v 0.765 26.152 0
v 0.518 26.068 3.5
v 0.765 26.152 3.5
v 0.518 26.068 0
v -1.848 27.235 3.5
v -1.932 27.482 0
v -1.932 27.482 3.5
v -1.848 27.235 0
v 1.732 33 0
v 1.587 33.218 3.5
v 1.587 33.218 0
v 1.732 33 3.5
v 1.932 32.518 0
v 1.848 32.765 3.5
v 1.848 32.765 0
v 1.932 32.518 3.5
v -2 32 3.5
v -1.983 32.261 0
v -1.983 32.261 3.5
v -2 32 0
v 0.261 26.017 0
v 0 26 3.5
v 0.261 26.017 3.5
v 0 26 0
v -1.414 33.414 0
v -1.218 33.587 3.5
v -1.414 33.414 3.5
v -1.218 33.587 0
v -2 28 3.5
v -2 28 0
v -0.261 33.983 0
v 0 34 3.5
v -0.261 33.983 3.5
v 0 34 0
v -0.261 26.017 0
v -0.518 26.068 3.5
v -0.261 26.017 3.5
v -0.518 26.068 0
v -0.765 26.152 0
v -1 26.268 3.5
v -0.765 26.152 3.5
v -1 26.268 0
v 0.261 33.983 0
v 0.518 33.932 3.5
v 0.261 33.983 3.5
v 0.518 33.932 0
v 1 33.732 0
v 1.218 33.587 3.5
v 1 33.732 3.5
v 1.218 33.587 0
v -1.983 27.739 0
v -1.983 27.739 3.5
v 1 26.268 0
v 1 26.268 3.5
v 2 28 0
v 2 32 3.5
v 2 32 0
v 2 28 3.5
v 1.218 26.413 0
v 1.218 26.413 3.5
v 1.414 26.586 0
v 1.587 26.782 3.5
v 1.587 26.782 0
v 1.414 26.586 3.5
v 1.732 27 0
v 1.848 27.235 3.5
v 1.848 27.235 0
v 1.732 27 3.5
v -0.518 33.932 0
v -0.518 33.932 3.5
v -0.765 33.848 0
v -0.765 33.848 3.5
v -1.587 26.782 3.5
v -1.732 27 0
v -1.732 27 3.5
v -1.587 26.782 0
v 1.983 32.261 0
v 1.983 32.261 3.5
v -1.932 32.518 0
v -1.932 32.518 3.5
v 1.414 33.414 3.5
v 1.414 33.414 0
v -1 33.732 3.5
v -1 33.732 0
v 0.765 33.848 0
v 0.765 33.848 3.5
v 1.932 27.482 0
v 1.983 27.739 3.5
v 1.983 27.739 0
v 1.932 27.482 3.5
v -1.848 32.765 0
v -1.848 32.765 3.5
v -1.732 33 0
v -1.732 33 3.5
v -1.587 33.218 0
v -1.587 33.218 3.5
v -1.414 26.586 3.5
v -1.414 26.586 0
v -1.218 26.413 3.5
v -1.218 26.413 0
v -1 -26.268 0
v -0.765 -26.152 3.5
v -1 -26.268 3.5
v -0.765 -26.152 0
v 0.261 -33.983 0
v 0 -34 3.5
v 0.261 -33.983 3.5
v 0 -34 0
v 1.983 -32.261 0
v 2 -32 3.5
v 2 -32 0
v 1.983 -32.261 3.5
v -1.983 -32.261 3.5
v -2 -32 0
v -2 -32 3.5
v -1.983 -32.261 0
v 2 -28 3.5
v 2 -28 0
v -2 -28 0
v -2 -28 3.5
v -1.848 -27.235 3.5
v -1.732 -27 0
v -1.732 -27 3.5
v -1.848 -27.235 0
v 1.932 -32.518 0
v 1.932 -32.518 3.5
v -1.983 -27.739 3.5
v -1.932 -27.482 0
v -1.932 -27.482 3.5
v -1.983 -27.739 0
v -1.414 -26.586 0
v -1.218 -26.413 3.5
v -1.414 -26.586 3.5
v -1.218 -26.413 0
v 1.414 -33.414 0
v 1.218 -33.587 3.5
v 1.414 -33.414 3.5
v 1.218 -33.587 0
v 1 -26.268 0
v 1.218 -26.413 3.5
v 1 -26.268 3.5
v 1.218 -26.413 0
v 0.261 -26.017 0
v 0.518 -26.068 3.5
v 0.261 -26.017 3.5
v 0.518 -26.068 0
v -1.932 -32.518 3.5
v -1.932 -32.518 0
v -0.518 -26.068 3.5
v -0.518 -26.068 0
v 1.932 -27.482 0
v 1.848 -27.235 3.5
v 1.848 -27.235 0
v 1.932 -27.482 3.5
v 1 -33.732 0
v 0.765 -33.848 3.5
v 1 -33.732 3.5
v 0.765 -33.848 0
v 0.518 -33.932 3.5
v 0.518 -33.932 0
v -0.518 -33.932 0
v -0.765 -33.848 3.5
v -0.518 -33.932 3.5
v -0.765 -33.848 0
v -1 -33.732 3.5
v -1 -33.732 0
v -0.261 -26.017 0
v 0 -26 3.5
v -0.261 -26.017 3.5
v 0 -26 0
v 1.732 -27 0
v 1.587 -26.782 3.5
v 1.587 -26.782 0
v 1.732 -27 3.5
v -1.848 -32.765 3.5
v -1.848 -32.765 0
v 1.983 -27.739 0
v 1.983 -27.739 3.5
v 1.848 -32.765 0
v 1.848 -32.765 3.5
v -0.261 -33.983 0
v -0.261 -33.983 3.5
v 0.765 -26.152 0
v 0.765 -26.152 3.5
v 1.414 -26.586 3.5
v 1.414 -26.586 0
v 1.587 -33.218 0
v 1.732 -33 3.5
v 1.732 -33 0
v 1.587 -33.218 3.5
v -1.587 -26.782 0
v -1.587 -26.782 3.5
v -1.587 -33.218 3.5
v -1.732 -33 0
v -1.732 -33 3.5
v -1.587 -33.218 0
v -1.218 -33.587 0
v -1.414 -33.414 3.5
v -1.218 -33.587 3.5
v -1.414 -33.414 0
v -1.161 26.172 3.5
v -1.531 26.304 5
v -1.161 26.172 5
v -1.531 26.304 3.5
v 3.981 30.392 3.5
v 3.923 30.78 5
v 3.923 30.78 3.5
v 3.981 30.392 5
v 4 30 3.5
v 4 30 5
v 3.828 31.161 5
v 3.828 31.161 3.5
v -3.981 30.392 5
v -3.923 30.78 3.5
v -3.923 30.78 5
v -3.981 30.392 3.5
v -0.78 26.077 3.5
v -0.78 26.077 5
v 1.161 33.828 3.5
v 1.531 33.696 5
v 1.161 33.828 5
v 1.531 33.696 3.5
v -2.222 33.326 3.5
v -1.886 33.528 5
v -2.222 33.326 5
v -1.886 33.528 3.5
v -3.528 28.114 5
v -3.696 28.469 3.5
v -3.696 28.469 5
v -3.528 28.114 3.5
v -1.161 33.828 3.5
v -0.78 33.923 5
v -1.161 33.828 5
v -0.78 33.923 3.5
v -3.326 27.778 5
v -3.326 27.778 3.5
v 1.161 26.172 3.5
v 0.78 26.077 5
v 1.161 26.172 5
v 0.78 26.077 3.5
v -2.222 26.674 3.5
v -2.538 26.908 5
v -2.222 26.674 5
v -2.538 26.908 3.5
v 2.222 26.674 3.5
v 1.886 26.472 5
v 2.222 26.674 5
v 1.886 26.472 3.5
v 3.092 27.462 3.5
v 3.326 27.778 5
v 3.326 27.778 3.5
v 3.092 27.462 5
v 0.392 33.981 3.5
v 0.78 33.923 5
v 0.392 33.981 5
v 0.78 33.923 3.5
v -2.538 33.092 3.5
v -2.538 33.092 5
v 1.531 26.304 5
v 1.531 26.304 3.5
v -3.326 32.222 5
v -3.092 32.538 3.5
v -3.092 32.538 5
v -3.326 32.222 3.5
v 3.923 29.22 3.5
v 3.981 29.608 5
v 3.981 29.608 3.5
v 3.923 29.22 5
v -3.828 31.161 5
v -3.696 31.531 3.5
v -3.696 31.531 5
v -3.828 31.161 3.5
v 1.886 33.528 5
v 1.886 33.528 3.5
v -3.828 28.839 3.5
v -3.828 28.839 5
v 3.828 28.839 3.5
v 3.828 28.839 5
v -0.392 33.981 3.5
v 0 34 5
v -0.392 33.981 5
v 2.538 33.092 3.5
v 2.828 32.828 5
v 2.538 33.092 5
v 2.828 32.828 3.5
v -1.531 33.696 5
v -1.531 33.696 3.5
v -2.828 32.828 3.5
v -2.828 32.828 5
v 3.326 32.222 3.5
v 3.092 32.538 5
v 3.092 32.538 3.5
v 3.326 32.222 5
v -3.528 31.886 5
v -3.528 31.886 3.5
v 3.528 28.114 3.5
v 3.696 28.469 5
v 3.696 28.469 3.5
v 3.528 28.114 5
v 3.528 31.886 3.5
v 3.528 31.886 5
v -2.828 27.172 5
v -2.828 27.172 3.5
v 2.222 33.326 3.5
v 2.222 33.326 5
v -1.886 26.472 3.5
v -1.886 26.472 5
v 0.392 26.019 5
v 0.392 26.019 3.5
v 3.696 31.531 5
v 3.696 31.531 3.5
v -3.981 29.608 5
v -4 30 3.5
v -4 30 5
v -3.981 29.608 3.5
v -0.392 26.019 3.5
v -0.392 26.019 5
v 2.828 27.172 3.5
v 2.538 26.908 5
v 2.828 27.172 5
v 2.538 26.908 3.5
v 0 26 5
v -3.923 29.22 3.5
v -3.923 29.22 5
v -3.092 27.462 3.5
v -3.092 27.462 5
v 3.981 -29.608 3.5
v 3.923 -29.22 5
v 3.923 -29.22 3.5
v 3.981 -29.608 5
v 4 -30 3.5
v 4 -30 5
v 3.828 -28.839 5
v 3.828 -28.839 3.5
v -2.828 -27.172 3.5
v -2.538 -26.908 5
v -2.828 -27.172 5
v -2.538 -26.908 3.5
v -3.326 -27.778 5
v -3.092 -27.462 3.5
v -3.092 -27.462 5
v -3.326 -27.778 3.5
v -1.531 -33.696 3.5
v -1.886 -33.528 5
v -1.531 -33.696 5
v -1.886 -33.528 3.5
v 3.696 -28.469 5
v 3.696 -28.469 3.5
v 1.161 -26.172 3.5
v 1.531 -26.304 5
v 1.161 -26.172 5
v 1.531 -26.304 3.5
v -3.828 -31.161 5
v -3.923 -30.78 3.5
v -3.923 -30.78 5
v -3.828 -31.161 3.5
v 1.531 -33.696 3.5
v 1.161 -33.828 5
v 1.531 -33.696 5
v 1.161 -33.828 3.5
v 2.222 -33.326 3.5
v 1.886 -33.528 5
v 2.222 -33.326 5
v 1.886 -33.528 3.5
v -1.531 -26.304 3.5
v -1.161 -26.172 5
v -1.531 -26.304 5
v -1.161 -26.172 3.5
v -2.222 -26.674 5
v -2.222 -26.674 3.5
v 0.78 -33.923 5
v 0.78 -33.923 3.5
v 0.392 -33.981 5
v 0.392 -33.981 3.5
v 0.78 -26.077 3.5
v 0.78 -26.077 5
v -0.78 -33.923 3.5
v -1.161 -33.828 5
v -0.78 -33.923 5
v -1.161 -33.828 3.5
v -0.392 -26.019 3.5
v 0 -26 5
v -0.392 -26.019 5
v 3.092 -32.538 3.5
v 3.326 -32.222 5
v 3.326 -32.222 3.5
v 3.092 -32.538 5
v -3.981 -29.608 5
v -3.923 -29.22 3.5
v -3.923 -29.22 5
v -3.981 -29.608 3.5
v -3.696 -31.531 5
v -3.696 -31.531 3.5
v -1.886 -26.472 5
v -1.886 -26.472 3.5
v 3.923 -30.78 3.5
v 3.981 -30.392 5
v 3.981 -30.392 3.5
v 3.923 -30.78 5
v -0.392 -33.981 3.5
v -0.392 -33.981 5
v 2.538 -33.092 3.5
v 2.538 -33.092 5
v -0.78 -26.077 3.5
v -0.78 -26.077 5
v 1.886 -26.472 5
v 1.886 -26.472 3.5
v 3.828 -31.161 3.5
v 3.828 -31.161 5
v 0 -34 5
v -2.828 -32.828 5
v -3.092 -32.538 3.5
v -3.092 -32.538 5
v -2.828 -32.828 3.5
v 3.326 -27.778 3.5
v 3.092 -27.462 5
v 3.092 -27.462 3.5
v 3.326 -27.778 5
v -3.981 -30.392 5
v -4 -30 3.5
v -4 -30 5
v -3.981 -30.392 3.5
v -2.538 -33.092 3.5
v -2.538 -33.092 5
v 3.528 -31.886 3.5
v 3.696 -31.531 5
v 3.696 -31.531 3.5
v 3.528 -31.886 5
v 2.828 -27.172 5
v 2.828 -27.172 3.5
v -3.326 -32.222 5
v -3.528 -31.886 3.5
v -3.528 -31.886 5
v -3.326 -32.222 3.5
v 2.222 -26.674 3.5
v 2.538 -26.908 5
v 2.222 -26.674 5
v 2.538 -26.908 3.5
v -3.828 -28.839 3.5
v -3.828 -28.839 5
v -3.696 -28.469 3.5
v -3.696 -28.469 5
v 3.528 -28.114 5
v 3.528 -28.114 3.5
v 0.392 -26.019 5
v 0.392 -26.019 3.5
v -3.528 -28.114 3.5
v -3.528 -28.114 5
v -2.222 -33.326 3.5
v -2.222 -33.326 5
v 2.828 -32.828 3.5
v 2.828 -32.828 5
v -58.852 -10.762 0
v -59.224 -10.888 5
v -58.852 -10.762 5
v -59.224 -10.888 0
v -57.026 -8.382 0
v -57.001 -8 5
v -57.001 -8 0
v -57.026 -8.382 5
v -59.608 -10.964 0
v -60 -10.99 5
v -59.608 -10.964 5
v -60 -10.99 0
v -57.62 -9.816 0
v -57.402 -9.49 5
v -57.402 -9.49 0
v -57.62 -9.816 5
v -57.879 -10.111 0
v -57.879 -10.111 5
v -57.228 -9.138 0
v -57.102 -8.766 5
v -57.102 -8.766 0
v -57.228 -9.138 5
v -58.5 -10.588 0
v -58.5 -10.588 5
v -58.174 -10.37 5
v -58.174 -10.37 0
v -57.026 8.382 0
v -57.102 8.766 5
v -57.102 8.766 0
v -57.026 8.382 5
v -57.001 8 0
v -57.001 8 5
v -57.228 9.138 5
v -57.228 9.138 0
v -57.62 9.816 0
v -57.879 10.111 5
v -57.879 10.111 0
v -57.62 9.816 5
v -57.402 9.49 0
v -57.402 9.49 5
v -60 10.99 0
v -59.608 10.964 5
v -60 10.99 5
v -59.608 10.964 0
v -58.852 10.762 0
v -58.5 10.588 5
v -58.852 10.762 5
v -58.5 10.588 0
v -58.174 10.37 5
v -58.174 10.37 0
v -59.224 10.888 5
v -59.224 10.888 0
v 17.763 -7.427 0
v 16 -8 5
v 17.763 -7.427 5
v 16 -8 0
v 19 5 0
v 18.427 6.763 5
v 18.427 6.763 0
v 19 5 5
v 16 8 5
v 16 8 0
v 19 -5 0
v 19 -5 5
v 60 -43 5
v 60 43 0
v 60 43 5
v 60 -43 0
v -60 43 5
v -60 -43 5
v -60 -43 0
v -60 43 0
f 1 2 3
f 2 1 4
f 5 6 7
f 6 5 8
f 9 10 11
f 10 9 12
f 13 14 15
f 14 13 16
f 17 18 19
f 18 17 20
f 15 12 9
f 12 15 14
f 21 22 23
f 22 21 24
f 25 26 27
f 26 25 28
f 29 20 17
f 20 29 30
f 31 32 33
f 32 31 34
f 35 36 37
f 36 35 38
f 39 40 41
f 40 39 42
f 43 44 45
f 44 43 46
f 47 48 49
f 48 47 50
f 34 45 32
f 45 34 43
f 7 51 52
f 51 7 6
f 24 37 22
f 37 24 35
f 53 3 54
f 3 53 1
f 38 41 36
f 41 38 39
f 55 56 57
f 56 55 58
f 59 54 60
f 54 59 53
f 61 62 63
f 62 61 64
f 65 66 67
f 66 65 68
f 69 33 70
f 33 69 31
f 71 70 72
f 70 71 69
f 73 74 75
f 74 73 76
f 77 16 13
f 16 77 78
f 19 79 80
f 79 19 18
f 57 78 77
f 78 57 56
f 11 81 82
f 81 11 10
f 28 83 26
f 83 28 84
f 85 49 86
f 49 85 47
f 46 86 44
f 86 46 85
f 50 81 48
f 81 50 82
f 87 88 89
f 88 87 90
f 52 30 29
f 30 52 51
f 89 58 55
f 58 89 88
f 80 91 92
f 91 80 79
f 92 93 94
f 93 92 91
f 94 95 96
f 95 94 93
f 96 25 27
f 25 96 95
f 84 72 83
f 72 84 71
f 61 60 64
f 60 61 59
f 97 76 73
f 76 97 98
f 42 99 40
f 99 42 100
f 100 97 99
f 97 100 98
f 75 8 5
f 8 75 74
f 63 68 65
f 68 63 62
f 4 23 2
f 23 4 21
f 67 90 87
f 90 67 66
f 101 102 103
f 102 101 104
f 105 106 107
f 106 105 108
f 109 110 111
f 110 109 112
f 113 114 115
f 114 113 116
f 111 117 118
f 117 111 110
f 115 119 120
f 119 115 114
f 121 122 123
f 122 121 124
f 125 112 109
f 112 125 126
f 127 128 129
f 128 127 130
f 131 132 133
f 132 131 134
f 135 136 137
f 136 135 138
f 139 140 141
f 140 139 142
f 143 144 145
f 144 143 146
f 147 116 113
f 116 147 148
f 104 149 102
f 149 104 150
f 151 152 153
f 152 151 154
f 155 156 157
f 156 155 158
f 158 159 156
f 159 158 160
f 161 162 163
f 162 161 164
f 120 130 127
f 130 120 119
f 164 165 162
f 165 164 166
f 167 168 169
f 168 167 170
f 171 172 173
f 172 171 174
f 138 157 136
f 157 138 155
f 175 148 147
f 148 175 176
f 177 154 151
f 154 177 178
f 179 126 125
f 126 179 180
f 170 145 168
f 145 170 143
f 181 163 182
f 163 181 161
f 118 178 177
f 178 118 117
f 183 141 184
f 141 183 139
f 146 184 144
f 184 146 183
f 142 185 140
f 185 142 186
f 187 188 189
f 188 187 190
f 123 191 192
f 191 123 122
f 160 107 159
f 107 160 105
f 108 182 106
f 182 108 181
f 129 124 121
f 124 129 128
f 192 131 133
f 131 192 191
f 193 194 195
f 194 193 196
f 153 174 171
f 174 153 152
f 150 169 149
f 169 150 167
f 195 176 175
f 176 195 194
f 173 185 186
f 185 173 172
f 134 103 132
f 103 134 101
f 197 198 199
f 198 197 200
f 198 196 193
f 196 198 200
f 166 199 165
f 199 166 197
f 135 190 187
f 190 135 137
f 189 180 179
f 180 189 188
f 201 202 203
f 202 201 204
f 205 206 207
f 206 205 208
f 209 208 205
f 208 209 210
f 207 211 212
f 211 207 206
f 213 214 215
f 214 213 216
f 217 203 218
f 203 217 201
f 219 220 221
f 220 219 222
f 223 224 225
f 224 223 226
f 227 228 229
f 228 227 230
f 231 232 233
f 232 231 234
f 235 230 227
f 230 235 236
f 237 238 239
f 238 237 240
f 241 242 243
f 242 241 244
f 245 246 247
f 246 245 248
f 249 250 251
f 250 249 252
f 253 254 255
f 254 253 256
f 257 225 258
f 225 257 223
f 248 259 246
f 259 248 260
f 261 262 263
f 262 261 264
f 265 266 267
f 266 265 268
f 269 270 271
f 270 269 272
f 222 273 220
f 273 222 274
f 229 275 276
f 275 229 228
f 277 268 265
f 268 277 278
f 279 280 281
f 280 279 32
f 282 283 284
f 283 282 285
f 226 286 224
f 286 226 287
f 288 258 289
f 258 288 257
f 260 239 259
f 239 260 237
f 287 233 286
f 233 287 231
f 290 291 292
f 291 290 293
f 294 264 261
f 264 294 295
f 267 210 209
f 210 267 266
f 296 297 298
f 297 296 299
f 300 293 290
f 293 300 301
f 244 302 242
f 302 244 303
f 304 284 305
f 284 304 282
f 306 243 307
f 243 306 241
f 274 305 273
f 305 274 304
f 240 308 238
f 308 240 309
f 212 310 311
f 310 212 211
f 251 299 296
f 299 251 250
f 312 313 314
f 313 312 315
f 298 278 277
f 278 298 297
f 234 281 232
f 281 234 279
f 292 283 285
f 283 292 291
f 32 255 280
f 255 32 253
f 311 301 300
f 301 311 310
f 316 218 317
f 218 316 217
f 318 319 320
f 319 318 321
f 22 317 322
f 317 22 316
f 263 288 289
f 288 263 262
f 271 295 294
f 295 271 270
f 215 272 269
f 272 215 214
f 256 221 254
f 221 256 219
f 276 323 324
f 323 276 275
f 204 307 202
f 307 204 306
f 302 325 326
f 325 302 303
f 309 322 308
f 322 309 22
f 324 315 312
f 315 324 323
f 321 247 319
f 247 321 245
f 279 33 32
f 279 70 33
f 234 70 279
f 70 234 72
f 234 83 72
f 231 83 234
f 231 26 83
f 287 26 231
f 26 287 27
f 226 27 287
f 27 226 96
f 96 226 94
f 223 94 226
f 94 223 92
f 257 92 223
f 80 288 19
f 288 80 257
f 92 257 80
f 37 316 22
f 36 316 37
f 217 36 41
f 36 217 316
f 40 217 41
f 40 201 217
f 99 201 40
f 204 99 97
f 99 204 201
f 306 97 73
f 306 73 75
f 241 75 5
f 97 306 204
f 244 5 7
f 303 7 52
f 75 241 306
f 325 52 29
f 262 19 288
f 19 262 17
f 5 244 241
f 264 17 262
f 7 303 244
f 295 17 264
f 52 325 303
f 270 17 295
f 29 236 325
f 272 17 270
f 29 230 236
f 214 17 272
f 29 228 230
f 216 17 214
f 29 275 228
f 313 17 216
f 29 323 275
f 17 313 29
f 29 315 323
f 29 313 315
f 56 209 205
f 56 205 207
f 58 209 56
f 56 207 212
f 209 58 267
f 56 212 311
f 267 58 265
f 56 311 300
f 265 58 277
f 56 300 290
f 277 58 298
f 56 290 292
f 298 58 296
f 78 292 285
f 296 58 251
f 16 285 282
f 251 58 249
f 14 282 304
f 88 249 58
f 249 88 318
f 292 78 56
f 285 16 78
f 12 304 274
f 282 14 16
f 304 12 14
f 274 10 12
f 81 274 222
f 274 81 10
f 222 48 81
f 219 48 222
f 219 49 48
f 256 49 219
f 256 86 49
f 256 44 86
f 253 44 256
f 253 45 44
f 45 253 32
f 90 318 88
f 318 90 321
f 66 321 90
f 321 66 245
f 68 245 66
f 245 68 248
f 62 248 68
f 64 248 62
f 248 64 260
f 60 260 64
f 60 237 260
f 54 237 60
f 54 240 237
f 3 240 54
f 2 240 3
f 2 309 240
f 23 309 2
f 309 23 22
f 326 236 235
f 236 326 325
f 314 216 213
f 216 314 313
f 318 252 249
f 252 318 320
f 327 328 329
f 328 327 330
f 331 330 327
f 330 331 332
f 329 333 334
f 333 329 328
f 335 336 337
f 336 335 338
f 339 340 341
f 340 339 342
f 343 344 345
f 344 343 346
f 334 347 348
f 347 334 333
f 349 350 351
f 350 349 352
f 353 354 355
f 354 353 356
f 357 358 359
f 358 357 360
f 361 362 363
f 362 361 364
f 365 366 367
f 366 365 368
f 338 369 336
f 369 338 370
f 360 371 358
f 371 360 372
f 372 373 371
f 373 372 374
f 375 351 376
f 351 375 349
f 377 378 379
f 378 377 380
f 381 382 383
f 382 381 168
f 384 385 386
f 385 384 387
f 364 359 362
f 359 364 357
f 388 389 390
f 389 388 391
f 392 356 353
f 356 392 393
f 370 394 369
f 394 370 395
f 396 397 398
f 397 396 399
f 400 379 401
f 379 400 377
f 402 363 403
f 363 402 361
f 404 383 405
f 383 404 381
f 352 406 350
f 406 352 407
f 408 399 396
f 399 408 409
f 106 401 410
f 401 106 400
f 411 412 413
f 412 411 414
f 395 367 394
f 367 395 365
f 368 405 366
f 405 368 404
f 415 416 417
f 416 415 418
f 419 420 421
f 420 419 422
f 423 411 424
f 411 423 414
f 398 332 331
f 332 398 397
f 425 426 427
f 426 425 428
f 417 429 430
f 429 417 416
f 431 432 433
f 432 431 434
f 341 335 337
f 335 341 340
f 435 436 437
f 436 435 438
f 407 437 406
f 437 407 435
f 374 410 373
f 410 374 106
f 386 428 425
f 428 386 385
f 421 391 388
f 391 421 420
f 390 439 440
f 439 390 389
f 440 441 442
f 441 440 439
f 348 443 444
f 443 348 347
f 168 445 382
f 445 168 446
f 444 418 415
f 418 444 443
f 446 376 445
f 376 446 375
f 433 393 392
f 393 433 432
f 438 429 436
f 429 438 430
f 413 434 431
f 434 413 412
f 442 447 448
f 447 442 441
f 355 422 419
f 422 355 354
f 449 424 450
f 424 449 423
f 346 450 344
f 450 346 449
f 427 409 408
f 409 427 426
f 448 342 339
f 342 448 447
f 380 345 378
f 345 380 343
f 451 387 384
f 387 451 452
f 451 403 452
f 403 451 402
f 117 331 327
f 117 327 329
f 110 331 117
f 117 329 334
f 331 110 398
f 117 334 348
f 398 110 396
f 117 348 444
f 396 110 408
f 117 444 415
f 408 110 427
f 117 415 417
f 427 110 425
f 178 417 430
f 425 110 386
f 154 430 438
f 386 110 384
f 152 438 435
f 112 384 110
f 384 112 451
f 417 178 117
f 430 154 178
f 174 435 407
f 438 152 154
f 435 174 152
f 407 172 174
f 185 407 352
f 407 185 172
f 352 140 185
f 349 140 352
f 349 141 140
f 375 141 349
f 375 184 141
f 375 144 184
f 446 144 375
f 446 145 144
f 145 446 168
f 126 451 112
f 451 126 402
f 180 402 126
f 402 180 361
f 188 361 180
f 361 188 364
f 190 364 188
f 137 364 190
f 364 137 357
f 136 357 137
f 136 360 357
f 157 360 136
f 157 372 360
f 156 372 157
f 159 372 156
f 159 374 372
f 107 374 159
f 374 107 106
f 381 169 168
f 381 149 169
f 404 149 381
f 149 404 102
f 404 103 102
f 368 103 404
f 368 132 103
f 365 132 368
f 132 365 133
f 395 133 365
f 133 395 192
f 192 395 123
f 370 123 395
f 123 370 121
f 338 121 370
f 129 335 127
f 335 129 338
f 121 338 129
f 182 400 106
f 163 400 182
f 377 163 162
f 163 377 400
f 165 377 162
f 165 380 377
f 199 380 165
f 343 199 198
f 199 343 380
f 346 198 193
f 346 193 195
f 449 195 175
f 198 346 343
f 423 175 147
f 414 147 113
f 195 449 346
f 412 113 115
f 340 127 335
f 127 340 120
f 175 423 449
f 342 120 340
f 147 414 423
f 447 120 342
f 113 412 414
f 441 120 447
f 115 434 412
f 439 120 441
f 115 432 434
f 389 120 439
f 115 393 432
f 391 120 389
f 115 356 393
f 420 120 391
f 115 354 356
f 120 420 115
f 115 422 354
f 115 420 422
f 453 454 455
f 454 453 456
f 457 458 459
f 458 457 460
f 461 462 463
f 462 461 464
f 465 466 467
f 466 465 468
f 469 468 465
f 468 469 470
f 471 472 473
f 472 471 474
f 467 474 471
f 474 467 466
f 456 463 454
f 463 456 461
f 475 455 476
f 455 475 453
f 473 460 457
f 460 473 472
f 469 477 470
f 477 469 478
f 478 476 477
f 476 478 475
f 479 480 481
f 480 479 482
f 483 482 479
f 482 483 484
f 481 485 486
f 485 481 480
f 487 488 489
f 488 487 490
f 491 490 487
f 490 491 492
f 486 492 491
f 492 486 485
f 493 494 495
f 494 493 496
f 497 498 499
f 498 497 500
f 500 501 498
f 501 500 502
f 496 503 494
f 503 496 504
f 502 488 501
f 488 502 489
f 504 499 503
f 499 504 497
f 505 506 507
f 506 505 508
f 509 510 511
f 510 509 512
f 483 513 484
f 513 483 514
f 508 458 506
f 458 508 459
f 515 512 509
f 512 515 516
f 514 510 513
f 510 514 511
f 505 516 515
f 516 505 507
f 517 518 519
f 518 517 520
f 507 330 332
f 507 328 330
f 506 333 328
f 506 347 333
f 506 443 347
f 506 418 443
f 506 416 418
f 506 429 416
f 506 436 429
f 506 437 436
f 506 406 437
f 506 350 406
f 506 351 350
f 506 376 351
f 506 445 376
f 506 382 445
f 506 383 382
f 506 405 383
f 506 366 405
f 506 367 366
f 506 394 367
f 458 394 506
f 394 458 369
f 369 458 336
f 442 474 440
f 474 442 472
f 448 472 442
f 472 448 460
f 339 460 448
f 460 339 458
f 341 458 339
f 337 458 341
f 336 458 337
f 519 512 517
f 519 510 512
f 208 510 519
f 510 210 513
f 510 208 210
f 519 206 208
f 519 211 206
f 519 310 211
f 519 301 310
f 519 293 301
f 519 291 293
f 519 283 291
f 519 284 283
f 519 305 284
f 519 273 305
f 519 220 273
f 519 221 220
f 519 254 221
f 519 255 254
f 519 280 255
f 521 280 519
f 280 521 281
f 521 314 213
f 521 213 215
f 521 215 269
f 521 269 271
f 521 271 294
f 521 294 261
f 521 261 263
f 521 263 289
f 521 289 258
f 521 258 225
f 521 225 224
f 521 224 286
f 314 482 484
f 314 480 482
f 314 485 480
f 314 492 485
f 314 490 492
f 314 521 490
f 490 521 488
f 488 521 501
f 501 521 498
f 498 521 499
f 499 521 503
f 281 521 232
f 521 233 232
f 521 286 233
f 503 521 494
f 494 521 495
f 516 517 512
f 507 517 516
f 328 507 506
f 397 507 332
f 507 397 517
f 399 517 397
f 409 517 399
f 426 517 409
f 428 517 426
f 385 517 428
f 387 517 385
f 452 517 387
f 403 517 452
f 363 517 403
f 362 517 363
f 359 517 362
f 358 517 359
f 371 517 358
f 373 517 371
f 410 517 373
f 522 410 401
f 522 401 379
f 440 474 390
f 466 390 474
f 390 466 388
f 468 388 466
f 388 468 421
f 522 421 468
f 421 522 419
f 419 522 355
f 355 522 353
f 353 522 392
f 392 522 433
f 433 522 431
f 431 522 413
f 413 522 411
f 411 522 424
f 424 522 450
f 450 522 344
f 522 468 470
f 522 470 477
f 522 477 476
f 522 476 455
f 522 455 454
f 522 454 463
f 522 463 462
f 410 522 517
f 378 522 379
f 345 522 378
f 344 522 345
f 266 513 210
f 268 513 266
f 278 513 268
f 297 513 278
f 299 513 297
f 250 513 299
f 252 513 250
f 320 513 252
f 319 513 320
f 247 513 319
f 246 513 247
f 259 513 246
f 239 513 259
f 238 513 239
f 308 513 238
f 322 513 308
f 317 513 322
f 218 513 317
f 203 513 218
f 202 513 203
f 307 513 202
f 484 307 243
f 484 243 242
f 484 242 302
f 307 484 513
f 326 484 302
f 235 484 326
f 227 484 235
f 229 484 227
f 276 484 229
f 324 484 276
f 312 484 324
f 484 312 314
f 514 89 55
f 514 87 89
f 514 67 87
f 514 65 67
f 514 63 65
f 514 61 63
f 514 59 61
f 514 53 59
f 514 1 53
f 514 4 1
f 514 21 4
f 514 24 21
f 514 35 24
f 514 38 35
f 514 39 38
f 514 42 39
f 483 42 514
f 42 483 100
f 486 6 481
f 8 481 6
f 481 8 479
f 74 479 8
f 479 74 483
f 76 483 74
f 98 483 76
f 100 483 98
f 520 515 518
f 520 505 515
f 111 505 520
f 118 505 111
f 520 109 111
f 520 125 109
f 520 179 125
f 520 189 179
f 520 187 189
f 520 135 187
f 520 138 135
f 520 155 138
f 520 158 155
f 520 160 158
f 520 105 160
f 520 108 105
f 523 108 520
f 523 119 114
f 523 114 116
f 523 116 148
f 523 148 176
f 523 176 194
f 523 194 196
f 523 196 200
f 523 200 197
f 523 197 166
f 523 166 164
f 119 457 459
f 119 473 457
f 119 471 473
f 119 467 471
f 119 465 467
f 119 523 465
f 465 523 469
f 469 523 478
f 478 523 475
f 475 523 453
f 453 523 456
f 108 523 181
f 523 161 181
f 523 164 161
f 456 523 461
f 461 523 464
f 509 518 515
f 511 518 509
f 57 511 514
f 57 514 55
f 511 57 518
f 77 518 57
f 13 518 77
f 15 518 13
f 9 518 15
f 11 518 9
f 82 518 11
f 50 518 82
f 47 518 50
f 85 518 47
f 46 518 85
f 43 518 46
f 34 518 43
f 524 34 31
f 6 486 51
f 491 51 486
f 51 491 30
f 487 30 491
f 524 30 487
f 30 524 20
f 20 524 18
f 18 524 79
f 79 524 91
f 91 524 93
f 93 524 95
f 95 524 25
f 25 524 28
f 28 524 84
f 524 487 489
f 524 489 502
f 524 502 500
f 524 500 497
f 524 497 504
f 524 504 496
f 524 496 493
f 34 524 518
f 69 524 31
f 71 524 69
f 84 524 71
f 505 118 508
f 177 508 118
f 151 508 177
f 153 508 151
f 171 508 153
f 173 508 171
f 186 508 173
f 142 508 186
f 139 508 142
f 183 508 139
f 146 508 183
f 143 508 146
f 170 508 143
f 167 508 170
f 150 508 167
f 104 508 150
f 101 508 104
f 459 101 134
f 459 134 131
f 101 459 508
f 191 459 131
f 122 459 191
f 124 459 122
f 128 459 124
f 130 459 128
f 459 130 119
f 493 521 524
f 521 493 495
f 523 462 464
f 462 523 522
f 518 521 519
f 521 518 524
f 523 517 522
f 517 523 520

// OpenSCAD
// =================== CONFIG ===================
standard     = "EU";   // "US" or "EU"

// Plate
plate_x      = 120;    // width (X)
plate_y      = 86;     // height (Y)
plate_z      = 5;      // thickness (Z)

// Junction-box standards
device_spacing_US = 83.3;  // mm (3.281")
device_spacing_EU = 60.0;  // mm (common EU round box)
device_hole_d_US  = 4.5;   // 6-32 clearance
device_hole_d_EU  = 4.0;   // M3–M3.5 clearance

use_slots    = true;       // oval slots for alignment wiggle
slot_play    = 4.0;        // slot length in the axis of spacing (mm)
cbore_d      = 8.0;        // counterbore diameter (pan/oval heads)
cbore_h      = 1.5;        // counterbore depth

// RJ45 cable cutout
cutout_w     = 16;         // width across the slot (perpendicular to travel)
round_r      = 3;          // corner radius of the tunnel

// US (slot travels along Y from the TOP edge toward center)
epsY_in      = 20;         // past center (Y direction)
epsY_out     = 0;          // outside beyond top edge

// EU (slot travels along X from the LEFT edge toward center)
epsX_in      = 20;         // past center (X direction)
epsX_out     = 0;          // outside beyond left edge

// Mouth rounding (small internal soften at the mouth edge)
lip_r        = 3.0;
lip_inset    = 1.0;        // how far inside the mouth edge to start the round

// =================== DERIVED ===================
isUS             = (standard == "US");
device_spacing   = isUS ? device_spacing_US : device_spacing_EU;
device_hole_d    = isUS ? device_hole_d_US  : device_hole_d_EU;

// Device screw positions: US along X, EU along Y
device_positions = isUS
  ? [ [ +device_spacing/2, 0 ],
      [ -device_spacing/2, 0 ] ]
  : [ [ 0,  +device_spacing/2 ],
      [ 0,  -device_spacing/2 ] ];

// =================== HELPERS ===================
// simple oval slots for screws
module slotX(d=4.0, len=4){
  hull(){
    translate([-len/2, 0, 0]) cylinder(h=plate_z+1, d=d, center=true, $fn=48);
    translate([+len/2, 0, 0]) cylinder(h=plate_z+1, d=d, center=true, $fn=48);
  }
}
module slotY(d=4.0, len=4){
  hull(){
    translate([0, -len/2, 0]) cylinder(h=plate_z+1, d=d, center=true, $fn=48);
    translate([0, +len/2, 0]) cylinder(h=plate_z+1, d=d, center=true, $fn=48);
  }
}

// robust 3D rounded slot made from a 2D rounded rectangle
module rounded_slot3d(len, wid, h, r){
  // len is travel direction, wid is transverse
  linear_extrude(height=h, center=true)
    offset(r=r)
      square([max(0.01,len-2*r), max(0.01,wid-2*r)], center=true);
}

// =================== MODEL ===================
difference(){
  // Base flat plate centered at origin
  translate([0,0, plate_z/2]) cube([plate_x, plate_y, plate_z], center=true);

  union(){
    // --- Junction-box holes/slots ---
    if (use_slots){
      for (p = device_positions)
        if (isUS)
          translate([p[0], p[1], plate_z/2]) slotX(d=device_hole_d, len=slot_play);
        else
          translate([p[0], p[1], plate_z/2]) slotY(d=device_hole_d, len=slot_play);
    } else {
      for (p = device_positions)
        translate([p[0], p[1], -0.5])
          cylinder(h=plate_z+1, d=device_hole_d, $fn=64);
    }

    // Counterbore for screw heads on top face
    for (p = device_positions)
      translate([p[0], p[1], plate_z - cbore_h])
        cylinder(h=cbore_h+0.01, d=cbore_d, $fn=64);

    // --- RJ45 cable cutout (centered through Z) ---
    cut_h = plate_z + 0.6;     // just exceed plate thickness
    cut_z = plate_z/2;         // center through Z

    if (isUS){
      // travels along Y from TOP edge
      y_top  = +plate_y/2;
      depthY = (plate_y/2 + epsY_in) + epsY_out;               // total travel along Y
      cy     = y_top - (( (plate_y/2 + epsY_in) - epsY_out )/2);

      translate([0, cy, cut_z])
        rounded_slot3d(depthY, cutout_w, cut_h, round_r);

      // small mouth soften at top edge
      mouth_y = y_top - lip_inset;
      for (sx = [-1, 1])
        translate([sx*(cutout_w/2 - 0.01), mouth_y, cut_z])
          cylinder(h=plate_z+0.6, r=lip_r, center=true, $fn=48);

    } else {
      // EU: travels along X from LEFT edge
      x_left = -plate_x/2 - 1;
      depthX = (plate_x/2 + epsX_in) + epsX_out;               // total travel along X
      cx     = x_left + epsX_out + depthX/2;

      translate([cx, 0, cut_z])
        // note: len=X depth, wid=slot width in Y
        rounded_slot3d(depthX, cutout_w, cut_h, round_r);

      // mouth soften at left edge
      mouth_x = x_left + lip_inset;
      for (sy = [-1, 1])
        translate([mouth_x, sy*(cutout_w/2 - 0.01), cut_z])
          cylinder(h=plate_z+0.6, r=lip_r, center=true, $fn=48);
    }
  }
}
